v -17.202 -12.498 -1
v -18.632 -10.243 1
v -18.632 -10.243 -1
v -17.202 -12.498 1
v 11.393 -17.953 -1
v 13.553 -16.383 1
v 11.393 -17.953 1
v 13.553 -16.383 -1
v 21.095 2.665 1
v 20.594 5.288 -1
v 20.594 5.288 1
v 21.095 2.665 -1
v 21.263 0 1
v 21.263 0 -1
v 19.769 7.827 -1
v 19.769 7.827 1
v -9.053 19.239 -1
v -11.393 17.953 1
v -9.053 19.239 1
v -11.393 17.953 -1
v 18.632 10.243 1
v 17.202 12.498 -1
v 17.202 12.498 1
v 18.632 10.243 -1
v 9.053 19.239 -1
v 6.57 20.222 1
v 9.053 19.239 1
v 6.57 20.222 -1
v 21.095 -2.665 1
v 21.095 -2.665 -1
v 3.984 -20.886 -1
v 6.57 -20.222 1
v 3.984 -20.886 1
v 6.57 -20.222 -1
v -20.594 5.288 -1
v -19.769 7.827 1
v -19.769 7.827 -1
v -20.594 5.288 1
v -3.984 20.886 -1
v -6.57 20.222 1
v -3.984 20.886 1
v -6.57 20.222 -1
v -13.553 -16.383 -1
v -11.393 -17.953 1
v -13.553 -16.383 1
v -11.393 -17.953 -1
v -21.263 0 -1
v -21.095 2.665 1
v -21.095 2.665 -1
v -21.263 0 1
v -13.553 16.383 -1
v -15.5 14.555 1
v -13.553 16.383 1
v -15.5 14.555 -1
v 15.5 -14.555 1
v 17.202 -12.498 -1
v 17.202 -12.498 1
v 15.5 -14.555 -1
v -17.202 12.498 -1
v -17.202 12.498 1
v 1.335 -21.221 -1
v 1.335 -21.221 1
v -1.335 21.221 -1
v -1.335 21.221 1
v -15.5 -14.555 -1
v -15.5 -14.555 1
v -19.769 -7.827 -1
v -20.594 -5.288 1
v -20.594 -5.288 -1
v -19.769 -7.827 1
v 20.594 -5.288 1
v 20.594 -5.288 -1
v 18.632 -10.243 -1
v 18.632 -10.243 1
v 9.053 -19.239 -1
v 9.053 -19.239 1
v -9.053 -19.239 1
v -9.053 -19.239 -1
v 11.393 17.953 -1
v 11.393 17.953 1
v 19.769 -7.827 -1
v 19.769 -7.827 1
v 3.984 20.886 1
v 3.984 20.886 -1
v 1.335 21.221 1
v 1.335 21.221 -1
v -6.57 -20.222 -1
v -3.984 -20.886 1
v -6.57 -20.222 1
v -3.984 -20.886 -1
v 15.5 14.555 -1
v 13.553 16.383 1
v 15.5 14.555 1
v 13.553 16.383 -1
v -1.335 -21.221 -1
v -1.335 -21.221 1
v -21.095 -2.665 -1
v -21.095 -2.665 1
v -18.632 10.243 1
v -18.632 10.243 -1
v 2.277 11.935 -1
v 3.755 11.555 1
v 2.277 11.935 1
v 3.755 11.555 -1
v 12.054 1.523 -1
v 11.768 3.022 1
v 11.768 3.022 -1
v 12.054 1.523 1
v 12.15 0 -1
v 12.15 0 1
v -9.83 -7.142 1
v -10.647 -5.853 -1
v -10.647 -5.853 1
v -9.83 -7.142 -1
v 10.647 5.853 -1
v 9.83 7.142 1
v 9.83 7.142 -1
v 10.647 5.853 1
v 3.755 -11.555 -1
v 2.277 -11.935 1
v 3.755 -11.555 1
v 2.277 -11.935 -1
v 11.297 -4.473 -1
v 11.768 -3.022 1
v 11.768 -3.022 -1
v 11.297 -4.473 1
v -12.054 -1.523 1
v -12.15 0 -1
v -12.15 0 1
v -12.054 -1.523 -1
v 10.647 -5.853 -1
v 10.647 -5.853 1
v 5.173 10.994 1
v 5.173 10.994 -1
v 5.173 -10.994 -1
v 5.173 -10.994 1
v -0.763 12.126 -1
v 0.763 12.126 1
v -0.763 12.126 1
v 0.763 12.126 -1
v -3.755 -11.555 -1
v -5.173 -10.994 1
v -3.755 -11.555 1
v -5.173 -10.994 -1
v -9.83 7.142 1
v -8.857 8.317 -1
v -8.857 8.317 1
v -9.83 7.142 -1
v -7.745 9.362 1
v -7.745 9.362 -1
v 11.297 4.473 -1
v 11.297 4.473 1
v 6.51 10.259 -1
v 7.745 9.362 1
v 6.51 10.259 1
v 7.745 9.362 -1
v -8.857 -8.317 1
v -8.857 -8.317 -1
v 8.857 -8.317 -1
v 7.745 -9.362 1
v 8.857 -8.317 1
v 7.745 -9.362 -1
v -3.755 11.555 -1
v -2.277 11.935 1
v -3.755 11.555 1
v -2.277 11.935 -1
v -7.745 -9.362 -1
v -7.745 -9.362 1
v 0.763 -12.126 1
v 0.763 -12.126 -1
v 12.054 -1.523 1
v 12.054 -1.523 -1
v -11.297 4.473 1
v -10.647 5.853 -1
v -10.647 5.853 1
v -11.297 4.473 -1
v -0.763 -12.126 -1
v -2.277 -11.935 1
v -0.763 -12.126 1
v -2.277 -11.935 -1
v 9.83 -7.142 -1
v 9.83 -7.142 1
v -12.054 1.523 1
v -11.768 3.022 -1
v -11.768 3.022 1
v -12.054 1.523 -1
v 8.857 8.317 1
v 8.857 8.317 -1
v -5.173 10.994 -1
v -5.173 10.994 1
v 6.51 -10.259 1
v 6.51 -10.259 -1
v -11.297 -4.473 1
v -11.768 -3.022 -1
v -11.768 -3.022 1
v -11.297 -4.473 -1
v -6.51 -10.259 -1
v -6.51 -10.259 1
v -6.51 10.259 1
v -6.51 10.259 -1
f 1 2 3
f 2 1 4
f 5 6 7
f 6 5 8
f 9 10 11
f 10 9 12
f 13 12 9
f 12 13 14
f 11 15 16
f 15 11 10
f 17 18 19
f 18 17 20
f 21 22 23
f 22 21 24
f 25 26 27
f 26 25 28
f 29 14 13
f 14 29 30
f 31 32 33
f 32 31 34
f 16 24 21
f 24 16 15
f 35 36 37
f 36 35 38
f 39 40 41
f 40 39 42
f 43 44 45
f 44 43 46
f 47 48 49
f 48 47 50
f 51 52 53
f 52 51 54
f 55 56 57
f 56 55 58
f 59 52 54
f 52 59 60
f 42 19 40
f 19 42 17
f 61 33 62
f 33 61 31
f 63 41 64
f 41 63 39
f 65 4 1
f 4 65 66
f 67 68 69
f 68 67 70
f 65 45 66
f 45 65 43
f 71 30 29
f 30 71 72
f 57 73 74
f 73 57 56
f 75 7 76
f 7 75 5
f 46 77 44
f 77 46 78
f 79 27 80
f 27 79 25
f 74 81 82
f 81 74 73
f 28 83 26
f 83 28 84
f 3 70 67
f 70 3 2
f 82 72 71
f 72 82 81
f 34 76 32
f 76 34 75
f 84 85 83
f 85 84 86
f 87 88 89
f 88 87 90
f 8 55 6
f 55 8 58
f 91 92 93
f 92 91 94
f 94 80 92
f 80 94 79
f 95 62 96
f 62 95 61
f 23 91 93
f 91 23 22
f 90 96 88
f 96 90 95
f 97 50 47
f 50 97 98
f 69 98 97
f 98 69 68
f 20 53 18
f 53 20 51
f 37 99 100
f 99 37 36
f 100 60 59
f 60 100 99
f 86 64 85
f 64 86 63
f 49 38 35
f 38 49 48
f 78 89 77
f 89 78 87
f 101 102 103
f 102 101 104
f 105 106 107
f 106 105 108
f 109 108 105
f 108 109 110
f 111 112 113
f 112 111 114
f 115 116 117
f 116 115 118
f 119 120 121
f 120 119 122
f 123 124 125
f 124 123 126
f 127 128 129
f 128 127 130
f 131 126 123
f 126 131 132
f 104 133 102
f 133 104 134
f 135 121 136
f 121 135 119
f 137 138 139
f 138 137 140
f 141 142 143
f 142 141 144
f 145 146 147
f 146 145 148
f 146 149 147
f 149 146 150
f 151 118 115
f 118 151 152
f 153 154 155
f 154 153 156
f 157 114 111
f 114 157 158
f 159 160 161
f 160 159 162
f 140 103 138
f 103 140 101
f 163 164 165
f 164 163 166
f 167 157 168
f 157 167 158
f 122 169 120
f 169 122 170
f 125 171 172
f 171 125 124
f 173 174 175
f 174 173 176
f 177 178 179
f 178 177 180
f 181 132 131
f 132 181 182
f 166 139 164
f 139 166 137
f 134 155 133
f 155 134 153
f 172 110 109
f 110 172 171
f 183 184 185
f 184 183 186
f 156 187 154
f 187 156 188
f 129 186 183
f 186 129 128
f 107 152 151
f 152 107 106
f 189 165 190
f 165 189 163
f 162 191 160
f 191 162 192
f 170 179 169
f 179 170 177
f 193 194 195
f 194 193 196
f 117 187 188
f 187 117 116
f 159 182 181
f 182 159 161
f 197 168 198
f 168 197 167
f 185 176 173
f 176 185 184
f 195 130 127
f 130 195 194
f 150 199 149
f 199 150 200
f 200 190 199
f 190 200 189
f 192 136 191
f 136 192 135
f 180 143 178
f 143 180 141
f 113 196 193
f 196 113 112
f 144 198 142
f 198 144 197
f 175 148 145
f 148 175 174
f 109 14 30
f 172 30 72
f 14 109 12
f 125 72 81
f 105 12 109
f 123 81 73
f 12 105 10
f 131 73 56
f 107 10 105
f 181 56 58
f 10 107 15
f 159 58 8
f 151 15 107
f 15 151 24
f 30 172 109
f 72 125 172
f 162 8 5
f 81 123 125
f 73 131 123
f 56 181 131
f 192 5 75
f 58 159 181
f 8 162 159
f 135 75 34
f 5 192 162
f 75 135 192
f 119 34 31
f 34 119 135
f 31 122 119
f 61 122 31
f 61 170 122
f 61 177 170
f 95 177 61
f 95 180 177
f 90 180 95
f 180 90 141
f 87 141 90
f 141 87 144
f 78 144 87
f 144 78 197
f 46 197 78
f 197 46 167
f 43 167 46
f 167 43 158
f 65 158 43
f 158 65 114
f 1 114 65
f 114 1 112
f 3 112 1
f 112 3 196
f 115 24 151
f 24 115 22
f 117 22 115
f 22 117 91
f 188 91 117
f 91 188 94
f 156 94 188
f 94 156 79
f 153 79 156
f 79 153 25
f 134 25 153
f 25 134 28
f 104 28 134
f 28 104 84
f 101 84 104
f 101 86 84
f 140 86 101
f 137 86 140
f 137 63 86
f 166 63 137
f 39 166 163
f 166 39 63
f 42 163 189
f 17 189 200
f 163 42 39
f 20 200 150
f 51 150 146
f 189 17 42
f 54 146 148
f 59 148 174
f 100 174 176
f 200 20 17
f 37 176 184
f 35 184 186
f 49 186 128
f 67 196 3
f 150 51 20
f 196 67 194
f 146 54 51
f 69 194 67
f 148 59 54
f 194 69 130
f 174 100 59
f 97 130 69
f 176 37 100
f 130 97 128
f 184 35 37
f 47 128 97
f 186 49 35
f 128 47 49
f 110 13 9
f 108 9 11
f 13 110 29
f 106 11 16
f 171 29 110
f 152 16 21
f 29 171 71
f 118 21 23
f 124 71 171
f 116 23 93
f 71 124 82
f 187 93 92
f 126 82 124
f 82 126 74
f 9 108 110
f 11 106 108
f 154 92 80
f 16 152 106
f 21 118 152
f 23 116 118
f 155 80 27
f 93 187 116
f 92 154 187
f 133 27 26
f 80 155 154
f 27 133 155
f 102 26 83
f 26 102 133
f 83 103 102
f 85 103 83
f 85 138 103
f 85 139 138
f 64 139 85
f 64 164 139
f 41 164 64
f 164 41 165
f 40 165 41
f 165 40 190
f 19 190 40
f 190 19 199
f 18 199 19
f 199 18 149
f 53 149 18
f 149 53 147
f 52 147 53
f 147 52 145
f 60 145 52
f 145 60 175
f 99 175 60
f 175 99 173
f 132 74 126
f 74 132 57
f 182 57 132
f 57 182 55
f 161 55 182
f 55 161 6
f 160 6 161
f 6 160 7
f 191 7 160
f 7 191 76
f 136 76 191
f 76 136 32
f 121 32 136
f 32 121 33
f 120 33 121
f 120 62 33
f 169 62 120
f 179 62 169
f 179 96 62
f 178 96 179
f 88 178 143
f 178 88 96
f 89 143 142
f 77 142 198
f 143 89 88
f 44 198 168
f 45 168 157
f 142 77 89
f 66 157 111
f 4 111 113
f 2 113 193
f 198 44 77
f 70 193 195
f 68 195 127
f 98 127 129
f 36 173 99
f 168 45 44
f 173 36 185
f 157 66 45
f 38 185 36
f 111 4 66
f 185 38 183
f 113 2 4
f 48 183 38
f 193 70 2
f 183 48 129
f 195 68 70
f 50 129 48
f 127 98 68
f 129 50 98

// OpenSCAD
// file: roundedcube.scad
// More information: https://danielupshaw.com/openscad-rounded-corners/

// Set to 0.01 for higher definition curves (renders slower)
$fs = 0.15;

module roundedcube(size = [1, 1, 1], center = false, radius = 0.5, apply_to = "all") {
	// If single value, convert to [x, y, z] vector
	size = (size[0] == undef) ? [size, size, size] : size;

	translate_min = radius;
	translate_xmax = size[0] - radius;
	translate_ymax = size[1] - radius;
	translate_zmax = size[2] - radius;

	diameter = radius * 2;

	obj_translate = (center == false) ?
		[0, 0, 0] : [
			-(size[0] / 2),
			-(size[1] / 2),
			-(size[2] / 2)
		];

	translate(v = obj_translate) {
		hull() {
			for (translate_x = [translate_min, translate_xmax]) {
				x_at = (translate_x == translate_min) ? "min" : "max";
				for (translate_y = [translate_min, translate_ymax]) {
					y_at = (translate_y == translate_min) ? "min" : "max";
					for (translate_z = [translate_min, translate_zmax]) {
						z_at = (translate_z == translate_min) ? "min" : "max";

						translate(v = [translate_x, translate_y, translate_z])
						if (
							(apply_to == "all") ||
							(apply_to == "xmin" && x_at == "min") || (apply_to == "xmax" && x_at == "max") ||
							(apply_to == "ymin" && y_at == "min") || (apply_to == "ymax" && y_at == "max") ||
							(apply_to == "zmin" && z_at == "min") || (apply_to == "zmax" && z_at == "max")
						) {
							sphere(r = radius);
						} else {
							rotate = 
								(apply_to == "xmin" || apply_to == "xmax" || apply_to == "x") ? [0, 90, 0] : (
								(apply_to == "ymin" || apply_to == "ymax" || apply_to == "y") ? [90, 90, 0] :
								[0, 0, 0]
							);
							rotate(a = rotate)
							cylinder(h = diameter, r = radius, center = true);
						}
					}
				}
			}
		}
	}
}
// file: parameters.scad
/* Copyright Brian Stephan 2023
 *
 * This file is part of the Buildable Stick System.
 *
 * The Buildable Stick System is free software: you can redistribute it and/or modify
 * it under the terms of the GNU General Public License as published by the
 * Free Software Foundation, either version 3 of the License, or (at your
 * option) any later version.
 *
 * The Buildable Stick System is distributed in the hope that it will be useful, but
 * WITHOUT ANY WARRANTY; without even the implied warranty of MERCHANTABILITY
 * or FITNESS FOR A PARTICULAR PURPOSE. See the GNU General Public License for
 * more details.
 *
 * You should have received a copy of the GNU General Public License along with
 * the Buildable Stick System. If not, see <https://www.gnu.org/licenses/>.
 */

// adjustments
hole_tolerance = 0.15;

// M2
m2_screw_selftap_radius = 0.95;

// M3
m3_screw_selftap_radius = 1.3;

// M4
m4_bolt_radius = 2 + hole_tolerance;
m4_bolt_countersink_radius = 6.1 + hole_tolerance;
m4_bolt_hex_exterior_radius = 3.6 + hole_tolerance;

// 24mm button
small_button_radius = 12 + hole_tolerance;

// 30mm button
big_button_radius = 15 + hole_tolerance;

// JLF mount dimensions
lever_mount_x = 53;
lever_mount_y = 95;
lever_mount_z = 2;

// standard lever hole
lever_plate_hole = 12;

// case dimensions
// base frame box. reminder: top of inside (including mounts) is chopped by top_plate_z for plates
frame_x = 233;
frame_y = 208;
frame_z = 50;

// depth of the "lip" of the frame that the top plate sets into/supports the overhang
frame_wall = 4;

// per neutrik (mm)
neutrik_panel_thickness = 3;

// top plate, which can either be the whole plate ("inset") or the mounting frame for a plate that overhangs
top_plate_x = frame_x - (frame_wall * 2);
top_plate_y = frame_y - (frame_wall * 2);
top_plate_z = 5;

// how much the top plate x/y is expanded to overhang the frame
// note that this is relative to the top plate (so the wall is added back)
top_plate_overhang_amount = 8.5;
overhang_top_plate_x = top_plate_x + (frame_wall * 2) + (top_plate_overhang_amount * 2);
overhang_top_plate_y = top_plate_y + (frame_wall * 2) + (top_plate_overhang_amount * 2);

plate_to_frame_point_x = (top_plate_x/2)-10;
plate_to_frame_point_y = (top_plate_y/2)-10;

// frame interior that supports the top plates
panel_support_width = 5;

// neutrik D screw holes
neutrik_d_screw_radius = 1.6 + hole_tolerance;
neutrik_d_radius = 12 + hole_tolerance;

// additional button radius for decorative panels, etc.
decorative_radius_scale = 1.75;
jumbo_decorative_radius_scale = 2;
// main file
/* Copyright Brian Stephan 2023
 *
 * This file is part of the Buildable Stick System.
 *
 * The Buildable Stick System is free software: you can redistribute it and/or modify
 * it under the terms of the GNU General Public License as published by the
 * Free Software Foundation, either version 3 of the License, or (at your
 * option) any later version.
 *
 * The Buildable Stick System is distributed in the hope that it will be useful, but
 * WITHOUT ANY WARRANTY; without even the implied warranty of MERCHANTABILITY
 * or FITNESS FOR A PARTICULAR PURPOSE. See the GNU General Public License for
 * more details.
 *
 * You should have received a copy of the GNU General Public License along with
 * the Buildable Stick System. If not, see <https://www.gnu.org/licenses/>.
 */

include <parameters.scad>
include <components.scad>

module button_24mm_decorative_plate() {
	difference() {
		// get a 2mm slice of the bigger button cylinders
		translate([0, 0, -55]) button_24mm_hole();
		translate([0, 0, -100]) cube([500, 500, 198], center=true);
		translate([0, 0, 100]) cube([500, 500, 198], center=true);
		// cut out the normal holes
		translate([0, 0, -1]) button_24mm_hole();
	}
}

button_24mm_decorative_plate();
